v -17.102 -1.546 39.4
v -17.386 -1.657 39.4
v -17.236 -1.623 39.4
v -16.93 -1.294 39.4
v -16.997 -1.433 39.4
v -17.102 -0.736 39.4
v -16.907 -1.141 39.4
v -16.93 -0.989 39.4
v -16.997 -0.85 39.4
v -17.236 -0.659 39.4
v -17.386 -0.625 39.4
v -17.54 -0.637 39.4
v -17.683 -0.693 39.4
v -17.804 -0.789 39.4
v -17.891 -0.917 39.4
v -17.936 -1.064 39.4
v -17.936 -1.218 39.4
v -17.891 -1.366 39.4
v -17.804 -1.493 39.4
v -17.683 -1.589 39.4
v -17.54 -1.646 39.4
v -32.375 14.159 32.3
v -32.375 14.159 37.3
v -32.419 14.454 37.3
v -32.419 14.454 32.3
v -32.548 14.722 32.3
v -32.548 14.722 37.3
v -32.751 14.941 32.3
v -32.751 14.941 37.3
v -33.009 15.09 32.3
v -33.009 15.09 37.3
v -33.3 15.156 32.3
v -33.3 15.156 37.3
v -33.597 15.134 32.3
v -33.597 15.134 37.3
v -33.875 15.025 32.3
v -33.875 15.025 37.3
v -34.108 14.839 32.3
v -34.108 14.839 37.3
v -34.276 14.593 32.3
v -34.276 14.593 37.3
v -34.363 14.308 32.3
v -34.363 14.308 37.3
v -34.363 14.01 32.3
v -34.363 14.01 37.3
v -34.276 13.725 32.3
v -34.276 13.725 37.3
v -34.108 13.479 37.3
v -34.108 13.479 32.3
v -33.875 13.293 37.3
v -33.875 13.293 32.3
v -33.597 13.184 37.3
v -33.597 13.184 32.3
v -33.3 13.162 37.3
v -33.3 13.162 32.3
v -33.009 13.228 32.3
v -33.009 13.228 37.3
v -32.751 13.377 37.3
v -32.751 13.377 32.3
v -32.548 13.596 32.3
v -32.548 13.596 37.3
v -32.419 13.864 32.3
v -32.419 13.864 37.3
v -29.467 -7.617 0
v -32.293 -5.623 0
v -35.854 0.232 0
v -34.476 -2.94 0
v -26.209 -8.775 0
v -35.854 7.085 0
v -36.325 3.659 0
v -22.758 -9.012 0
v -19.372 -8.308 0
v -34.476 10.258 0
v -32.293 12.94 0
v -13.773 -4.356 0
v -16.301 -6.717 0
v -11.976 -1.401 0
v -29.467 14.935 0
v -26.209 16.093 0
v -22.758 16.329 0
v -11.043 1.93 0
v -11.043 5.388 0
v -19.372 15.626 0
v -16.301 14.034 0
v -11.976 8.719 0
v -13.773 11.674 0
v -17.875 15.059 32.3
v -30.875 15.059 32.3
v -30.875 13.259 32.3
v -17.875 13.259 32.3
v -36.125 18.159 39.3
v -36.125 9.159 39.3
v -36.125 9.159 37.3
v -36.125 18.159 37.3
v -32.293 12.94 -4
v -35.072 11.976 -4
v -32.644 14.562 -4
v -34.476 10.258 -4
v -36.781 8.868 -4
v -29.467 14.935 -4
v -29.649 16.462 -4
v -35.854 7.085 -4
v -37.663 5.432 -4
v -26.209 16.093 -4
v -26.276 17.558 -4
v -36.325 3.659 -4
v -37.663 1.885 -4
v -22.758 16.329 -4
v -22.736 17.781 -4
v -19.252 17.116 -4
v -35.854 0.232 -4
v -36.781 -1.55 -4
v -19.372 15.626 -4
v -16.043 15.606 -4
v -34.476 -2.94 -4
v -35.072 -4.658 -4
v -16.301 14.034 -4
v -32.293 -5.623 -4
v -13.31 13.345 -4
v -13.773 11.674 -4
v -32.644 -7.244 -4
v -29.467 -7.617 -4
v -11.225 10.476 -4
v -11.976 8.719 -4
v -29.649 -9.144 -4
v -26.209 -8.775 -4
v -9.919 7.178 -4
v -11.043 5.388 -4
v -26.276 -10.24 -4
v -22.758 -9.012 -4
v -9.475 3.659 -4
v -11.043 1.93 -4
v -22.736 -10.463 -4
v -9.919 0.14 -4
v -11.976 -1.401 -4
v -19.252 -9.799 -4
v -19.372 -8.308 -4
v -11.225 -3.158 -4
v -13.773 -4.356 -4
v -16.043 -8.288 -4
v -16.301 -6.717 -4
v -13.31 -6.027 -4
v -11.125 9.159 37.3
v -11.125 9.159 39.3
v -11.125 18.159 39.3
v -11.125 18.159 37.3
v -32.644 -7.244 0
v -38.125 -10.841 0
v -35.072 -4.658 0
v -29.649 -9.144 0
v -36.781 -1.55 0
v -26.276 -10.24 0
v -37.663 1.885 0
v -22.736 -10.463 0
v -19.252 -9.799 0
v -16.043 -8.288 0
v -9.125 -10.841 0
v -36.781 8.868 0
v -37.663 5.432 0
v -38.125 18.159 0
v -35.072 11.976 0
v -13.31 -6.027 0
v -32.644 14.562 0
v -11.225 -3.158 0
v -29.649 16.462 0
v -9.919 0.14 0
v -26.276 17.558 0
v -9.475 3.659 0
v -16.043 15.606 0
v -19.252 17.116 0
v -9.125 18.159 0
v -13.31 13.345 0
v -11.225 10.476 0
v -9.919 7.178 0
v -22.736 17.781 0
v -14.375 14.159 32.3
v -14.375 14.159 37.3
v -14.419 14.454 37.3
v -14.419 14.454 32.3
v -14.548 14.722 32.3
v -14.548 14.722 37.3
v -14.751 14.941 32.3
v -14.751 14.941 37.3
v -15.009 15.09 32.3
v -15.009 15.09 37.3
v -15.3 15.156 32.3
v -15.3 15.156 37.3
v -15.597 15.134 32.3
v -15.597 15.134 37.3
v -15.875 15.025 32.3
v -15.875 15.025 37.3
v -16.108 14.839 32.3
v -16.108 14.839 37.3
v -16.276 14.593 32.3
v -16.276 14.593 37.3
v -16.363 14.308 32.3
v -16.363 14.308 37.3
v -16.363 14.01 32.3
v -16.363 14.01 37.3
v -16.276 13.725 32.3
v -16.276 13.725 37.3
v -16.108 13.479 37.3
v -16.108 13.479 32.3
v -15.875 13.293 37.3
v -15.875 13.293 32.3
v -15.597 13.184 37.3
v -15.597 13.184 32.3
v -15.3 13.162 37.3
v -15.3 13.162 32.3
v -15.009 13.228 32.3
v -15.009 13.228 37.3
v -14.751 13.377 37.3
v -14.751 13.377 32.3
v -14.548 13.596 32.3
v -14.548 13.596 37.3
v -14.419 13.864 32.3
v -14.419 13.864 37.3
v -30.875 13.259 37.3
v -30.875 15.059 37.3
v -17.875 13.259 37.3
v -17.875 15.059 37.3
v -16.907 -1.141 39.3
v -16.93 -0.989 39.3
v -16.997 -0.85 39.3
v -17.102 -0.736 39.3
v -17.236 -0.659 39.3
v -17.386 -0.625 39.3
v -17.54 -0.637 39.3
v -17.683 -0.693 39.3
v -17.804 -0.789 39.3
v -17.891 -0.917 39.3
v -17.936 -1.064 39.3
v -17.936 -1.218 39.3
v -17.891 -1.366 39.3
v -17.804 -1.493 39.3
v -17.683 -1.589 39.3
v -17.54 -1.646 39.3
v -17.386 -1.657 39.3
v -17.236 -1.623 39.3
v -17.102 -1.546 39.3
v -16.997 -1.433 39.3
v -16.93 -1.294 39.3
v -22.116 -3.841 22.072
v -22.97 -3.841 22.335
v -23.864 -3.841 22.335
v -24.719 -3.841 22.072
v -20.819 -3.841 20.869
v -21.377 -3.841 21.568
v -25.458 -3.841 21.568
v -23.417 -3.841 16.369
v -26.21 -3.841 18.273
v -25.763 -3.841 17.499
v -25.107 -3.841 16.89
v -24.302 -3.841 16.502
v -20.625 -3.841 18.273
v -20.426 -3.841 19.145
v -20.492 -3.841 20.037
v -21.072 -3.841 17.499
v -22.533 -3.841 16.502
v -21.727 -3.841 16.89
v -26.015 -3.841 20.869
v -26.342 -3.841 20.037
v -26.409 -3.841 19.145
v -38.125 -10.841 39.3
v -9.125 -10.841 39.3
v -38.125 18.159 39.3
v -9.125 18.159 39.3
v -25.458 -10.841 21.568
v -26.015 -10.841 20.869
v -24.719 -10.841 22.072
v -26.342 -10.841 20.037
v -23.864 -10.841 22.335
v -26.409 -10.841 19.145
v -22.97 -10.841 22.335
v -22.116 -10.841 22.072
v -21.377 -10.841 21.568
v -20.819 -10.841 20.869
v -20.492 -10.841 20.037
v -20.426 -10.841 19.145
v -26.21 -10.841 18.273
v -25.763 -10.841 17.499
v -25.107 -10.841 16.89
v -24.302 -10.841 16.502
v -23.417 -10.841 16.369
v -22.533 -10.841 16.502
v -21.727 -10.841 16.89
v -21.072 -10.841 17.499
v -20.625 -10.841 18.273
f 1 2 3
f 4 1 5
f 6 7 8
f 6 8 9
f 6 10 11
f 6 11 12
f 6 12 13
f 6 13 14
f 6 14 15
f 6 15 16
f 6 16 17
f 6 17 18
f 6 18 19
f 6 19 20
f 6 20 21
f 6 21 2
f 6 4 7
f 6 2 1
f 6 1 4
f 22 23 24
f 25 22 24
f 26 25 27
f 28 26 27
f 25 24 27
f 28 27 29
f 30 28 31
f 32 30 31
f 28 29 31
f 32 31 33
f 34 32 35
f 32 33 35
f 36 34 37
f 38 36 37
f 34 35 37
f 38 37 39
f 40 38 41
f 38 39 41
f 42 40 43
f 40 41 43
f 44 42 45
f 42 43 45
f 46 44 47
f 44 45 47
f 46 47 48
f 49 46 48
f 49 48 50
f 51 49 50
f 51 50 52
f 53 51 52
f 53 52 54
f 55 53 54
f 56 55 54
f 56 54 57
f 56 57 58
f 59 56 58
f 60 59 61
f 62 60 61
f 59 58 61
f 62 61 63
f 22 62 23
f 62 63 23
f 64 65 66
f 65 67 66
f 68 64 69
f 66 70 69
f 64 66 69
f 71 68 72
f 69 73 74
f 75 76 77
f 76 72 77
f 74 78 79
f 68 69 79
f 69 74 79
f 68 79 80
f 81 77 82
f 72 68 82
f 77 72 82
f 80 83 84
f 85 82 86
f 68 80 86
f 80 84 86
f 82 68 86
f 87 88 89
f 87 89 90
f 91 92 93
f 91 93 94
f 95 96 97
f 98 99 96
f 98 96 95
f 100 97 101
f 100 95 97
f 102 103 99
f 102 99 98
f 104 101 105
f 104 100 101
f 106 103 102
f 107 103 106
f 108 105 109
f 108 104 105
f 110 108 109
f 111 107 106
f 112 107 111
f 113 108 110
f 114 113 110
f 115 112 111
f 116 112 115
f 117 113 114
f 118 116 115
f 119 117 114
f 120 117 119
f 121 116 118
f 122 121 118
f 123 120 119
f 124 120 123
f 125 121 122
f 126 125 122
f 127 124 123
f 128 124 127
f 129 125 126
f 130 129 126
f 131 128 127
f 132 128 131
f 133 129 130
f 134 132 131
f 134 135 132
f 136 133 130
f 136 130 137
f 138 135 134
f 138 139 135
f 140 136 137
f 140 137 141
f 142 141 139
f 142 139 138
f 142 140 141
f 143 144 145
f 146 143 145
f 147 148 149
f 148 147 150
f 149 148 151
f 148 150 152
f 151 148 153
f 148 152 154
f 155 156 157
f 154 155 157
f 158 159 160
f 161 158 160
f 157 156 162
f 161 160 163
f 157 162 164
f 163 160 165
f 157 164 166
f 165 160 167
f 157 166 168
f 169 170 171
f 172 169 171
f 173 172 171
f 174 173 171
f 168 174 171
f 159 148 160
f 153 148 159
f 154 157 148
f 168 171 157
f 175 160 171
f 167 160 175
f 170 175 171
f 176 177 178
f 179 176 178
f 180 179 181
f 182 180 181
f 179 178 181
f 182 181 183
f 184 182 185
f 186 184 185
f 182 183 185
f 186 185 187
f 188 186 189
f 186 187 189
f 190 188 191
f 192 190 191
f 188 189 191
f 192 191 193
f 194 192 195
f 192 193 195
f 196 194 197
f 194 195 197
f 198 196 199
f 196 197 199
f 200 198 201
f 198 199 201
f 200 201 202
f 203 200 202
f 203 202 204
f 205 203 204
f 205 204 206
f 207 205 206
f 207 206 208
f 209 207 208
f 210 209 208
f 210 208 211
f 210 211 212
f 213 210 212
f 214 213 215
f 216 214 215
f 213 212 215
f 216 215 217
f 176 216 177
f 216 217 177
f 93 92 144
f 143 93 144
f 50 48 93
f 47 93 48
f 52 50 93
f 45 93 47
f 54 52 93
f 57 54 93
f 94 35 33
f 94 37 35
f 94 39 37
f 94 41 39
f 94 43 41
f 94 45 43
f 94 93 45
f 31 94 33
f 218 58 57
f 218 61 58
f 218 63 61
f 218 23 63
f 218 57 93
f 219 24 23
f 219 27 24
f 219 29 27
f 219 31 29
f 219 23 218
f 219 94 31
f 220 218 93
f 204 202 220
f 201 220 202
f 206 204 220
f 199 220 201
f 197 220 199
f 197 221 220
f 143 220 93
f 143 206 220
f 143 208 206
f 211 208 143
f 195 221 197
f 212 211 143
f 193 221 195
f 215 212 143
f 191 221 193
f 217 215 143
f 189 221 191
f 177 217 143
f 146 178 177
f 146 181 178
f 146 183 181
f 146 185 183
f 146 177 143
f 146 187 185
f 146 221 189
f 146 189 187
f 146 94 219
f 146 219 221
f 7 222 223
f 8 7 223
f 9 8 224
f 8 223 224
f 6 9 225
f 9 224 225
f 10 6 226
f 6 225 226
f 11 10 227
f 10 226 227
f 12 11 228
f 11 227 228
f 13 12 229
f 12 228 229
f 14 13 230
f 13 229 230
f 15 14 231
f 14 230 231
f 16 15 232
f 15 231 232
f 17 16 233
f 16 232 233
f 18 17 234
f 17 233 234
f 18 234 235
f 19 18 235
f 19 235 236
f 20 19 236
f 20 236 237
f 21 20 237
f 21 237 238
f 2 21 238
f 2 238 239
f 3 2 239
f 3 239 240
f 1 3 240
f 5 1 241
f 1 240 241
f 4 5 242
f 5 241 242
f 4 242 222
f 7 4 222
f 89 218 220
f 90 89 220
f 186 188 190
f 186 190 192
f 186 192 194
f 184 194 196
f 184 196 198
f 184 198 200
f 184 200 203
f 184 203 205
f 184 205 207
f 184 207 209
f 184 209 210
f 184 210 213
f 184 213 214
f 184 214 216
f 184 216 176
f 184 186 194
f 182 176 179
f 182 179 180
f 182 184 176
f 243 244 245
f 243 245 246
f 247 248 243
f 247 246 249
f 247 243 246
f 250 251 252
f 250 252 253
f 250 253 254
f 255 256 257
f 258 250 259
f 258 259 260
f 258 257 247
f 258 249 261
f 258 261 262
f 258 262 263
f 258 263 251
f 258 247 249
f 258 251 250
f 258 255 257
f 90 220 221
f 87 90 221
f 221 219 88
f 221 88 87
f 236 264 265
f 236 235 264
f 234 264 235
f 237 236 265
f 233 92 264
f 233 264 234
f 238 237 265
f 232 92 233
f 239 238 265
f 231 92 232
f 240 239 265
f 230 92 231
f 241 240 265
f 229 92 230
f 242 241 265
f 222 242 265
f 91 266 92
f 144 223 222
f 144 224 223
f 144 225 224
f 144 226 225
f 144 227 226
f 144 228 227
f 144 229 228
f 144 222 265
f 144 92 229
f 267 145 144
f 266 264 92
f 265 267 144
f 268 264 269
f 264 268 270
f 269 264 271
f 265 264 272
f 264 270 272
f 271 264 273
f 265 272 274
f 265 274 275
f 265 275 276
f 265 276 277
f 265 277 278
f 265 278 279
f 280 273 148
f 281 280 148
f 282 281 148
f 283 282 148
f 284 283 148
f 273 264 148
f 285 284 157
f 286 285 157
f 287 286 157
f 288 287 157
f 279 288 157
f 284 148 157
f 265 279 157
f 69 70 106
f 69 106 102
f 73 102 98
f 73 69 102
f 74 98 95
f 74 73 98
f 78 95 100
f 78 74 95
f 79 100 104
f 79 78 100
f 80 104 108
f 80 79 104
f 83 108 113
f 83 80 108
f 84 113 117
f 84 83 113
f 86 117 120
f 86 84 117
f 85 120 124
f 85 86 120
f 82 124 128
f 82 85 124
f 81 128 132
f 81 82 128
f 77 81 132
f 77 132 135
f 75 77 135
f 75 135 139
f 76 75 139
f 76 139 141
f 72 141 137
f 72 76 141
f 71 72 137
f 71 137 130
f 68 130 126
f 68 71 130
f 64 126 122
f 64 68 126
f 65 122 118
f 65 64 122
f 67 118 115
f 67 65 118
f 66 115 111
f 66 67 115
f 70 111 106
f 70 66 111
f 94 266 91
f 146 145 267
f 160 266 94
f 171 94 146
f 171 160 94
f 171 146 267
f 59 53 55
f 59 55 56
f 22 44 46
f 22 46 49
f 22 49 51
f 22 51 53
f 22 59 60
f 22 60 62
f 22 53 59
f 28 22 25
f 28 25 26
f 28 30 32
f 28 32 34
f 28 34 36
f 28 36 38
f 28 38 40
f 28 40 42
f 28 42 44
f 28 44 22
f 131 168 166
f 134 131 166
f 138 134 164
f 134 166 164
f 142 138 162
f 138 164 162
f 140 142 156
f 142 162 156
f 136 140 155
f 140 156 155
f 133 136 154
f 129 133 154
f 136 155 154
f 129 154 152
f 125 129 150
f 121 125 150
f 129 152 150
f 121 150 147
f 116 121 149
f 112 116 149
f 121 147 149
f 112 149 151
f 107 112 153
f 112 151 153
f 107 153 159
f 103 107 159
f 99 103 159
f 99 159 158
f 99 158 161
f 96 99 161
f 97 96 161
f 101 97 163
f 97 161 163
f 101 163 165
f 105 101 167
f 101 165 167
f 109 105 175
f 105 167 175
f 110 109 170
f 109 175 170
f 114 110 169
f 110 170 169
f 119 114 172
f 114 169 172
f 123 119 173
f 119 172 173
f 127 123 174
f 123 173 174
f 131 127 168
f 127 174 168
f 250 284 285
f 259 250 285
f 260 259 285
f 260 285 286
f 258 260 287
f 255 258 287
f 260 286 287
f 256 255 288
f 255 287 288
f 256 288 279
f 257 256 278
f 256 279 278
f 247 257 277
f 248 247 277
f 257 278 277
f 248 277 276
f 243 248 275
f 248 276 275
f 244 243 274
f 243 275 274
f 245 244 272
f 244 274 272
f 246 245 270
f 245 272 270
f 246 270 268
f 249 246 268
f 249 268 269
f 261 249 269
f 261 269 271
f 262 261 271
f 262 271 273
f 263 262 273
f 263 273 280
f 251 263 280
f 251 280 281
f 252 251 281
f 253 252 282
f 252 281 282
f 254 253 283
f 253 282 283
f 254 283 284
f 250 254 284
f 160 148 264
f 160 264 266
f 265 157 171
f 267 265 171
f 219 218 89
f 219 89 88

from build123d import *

# Parameters (mm, degrees)
SKETCH2_W           = 29
SKETCH2_H           = 29
BOSS_EXTRUDE1_DEPTH = 39.3
SKETCH3_R           = 14.15
SKETCH3_R_2         = 12.7
BOSS_EXTRUDE2_DEPTH = 4
SKETCH4_W           = 25
SKETCH4_H           = 9
CUT_EXTRUDE1_DEPTH  = 2
SKETCH5_R           = 1
SKETCH5_W           = 13
SKETCH5_H           = 1.8
CUT_EXTRUDE2_DEPTH  = 5
SKETCH6_R           = 0.517544676
BOSS_EXTRUDE3_DEPTH = 0.1
SKETCH7_R           = 3
CUT_EXTRUDE3_DEPTH  = 7


with BuildPart() as part:
    # Sketch2 → Boss-Extrude1 (new body)
    with BuildSketch(Plane.XY):
        with Locations((-23.624610592, 3.658878505)):
            Rectangle(SKETCH2_W, SKETCH2_H)
    extrude(amount=BOSS_EXTRUDE1_DEPTH)

    # Sketch3 → Boss-Extrude2 (add)
    with BuildSketch(Plane(origin=(0, 0, 0), x_dir=(-1, 0, 0), z_dir=(0, 0, -1))):
        with Locations(Location((23.624610592, 3.658878505, 0), (0, 0, 180))):
            Circle(SKETCH3_R)
        with Locations((23.624610592, 3.658878505)):
            Circle(SKETCH3_R_2, mode=Mode.SUBTRACT)
    extrude(amount=BOSS_EXTRUDE2_DEPTH)

    # Sketch4 → Cut-Extrude1 (cut)
    with BuildSketch(Plane.XY.offset(39.3)):
        with Locations((-23.624610592, 13.658878505)):
            Rectangle(SKETCH4_W, SKETCH4_H)
    extrude(amount=-CUT_EXTRUDE1_DEPTH, mode=Mode.SUBTRACT)

    # Sketch5 → Cut-Extrude2 (cut)
    with BuildSketch(Plane.XY.offset(37.3)):
        with Locations((-33.374610592, 14.158878505)):
            Circle(SKETCH5_R)
        with Locations((-15.374610592, 14.158878505)):
            Circle(SKETCH5_R)
        with Locations((-24.374610592, 14.158878505)):
            Rectangle(SKETCH5_W, SKETCH5_H)
    extrude(amount=-CUT_EXTRUDE2_DEPTH, mode=Mode.SUBTRACT)

    # Sketch6 → Boss-Extrude3 (add)
    with BuildSketch(Plane.XY.offset(39.3)):
        with Locations((-17.424610592, -1.141121495)):
            Circle(SKETCH6_R)
    extrude(amount=BOSS_EXTRUDE3_DEPTH)

    # Sketch7 → Cut-Extrude3 (cut)
    with BuildSketch(Plane.XZ.offset(10.841121495)):
        with Locations(Location((-23.417250102, 19.368990784, 0), (0, 0, 270))):
            Circle(SKETCH7_R)
    extrude(amount=-CUT_EXTRUDE3_DEPTH, mode=Mode.SUBTRACT)


solid = part.part
